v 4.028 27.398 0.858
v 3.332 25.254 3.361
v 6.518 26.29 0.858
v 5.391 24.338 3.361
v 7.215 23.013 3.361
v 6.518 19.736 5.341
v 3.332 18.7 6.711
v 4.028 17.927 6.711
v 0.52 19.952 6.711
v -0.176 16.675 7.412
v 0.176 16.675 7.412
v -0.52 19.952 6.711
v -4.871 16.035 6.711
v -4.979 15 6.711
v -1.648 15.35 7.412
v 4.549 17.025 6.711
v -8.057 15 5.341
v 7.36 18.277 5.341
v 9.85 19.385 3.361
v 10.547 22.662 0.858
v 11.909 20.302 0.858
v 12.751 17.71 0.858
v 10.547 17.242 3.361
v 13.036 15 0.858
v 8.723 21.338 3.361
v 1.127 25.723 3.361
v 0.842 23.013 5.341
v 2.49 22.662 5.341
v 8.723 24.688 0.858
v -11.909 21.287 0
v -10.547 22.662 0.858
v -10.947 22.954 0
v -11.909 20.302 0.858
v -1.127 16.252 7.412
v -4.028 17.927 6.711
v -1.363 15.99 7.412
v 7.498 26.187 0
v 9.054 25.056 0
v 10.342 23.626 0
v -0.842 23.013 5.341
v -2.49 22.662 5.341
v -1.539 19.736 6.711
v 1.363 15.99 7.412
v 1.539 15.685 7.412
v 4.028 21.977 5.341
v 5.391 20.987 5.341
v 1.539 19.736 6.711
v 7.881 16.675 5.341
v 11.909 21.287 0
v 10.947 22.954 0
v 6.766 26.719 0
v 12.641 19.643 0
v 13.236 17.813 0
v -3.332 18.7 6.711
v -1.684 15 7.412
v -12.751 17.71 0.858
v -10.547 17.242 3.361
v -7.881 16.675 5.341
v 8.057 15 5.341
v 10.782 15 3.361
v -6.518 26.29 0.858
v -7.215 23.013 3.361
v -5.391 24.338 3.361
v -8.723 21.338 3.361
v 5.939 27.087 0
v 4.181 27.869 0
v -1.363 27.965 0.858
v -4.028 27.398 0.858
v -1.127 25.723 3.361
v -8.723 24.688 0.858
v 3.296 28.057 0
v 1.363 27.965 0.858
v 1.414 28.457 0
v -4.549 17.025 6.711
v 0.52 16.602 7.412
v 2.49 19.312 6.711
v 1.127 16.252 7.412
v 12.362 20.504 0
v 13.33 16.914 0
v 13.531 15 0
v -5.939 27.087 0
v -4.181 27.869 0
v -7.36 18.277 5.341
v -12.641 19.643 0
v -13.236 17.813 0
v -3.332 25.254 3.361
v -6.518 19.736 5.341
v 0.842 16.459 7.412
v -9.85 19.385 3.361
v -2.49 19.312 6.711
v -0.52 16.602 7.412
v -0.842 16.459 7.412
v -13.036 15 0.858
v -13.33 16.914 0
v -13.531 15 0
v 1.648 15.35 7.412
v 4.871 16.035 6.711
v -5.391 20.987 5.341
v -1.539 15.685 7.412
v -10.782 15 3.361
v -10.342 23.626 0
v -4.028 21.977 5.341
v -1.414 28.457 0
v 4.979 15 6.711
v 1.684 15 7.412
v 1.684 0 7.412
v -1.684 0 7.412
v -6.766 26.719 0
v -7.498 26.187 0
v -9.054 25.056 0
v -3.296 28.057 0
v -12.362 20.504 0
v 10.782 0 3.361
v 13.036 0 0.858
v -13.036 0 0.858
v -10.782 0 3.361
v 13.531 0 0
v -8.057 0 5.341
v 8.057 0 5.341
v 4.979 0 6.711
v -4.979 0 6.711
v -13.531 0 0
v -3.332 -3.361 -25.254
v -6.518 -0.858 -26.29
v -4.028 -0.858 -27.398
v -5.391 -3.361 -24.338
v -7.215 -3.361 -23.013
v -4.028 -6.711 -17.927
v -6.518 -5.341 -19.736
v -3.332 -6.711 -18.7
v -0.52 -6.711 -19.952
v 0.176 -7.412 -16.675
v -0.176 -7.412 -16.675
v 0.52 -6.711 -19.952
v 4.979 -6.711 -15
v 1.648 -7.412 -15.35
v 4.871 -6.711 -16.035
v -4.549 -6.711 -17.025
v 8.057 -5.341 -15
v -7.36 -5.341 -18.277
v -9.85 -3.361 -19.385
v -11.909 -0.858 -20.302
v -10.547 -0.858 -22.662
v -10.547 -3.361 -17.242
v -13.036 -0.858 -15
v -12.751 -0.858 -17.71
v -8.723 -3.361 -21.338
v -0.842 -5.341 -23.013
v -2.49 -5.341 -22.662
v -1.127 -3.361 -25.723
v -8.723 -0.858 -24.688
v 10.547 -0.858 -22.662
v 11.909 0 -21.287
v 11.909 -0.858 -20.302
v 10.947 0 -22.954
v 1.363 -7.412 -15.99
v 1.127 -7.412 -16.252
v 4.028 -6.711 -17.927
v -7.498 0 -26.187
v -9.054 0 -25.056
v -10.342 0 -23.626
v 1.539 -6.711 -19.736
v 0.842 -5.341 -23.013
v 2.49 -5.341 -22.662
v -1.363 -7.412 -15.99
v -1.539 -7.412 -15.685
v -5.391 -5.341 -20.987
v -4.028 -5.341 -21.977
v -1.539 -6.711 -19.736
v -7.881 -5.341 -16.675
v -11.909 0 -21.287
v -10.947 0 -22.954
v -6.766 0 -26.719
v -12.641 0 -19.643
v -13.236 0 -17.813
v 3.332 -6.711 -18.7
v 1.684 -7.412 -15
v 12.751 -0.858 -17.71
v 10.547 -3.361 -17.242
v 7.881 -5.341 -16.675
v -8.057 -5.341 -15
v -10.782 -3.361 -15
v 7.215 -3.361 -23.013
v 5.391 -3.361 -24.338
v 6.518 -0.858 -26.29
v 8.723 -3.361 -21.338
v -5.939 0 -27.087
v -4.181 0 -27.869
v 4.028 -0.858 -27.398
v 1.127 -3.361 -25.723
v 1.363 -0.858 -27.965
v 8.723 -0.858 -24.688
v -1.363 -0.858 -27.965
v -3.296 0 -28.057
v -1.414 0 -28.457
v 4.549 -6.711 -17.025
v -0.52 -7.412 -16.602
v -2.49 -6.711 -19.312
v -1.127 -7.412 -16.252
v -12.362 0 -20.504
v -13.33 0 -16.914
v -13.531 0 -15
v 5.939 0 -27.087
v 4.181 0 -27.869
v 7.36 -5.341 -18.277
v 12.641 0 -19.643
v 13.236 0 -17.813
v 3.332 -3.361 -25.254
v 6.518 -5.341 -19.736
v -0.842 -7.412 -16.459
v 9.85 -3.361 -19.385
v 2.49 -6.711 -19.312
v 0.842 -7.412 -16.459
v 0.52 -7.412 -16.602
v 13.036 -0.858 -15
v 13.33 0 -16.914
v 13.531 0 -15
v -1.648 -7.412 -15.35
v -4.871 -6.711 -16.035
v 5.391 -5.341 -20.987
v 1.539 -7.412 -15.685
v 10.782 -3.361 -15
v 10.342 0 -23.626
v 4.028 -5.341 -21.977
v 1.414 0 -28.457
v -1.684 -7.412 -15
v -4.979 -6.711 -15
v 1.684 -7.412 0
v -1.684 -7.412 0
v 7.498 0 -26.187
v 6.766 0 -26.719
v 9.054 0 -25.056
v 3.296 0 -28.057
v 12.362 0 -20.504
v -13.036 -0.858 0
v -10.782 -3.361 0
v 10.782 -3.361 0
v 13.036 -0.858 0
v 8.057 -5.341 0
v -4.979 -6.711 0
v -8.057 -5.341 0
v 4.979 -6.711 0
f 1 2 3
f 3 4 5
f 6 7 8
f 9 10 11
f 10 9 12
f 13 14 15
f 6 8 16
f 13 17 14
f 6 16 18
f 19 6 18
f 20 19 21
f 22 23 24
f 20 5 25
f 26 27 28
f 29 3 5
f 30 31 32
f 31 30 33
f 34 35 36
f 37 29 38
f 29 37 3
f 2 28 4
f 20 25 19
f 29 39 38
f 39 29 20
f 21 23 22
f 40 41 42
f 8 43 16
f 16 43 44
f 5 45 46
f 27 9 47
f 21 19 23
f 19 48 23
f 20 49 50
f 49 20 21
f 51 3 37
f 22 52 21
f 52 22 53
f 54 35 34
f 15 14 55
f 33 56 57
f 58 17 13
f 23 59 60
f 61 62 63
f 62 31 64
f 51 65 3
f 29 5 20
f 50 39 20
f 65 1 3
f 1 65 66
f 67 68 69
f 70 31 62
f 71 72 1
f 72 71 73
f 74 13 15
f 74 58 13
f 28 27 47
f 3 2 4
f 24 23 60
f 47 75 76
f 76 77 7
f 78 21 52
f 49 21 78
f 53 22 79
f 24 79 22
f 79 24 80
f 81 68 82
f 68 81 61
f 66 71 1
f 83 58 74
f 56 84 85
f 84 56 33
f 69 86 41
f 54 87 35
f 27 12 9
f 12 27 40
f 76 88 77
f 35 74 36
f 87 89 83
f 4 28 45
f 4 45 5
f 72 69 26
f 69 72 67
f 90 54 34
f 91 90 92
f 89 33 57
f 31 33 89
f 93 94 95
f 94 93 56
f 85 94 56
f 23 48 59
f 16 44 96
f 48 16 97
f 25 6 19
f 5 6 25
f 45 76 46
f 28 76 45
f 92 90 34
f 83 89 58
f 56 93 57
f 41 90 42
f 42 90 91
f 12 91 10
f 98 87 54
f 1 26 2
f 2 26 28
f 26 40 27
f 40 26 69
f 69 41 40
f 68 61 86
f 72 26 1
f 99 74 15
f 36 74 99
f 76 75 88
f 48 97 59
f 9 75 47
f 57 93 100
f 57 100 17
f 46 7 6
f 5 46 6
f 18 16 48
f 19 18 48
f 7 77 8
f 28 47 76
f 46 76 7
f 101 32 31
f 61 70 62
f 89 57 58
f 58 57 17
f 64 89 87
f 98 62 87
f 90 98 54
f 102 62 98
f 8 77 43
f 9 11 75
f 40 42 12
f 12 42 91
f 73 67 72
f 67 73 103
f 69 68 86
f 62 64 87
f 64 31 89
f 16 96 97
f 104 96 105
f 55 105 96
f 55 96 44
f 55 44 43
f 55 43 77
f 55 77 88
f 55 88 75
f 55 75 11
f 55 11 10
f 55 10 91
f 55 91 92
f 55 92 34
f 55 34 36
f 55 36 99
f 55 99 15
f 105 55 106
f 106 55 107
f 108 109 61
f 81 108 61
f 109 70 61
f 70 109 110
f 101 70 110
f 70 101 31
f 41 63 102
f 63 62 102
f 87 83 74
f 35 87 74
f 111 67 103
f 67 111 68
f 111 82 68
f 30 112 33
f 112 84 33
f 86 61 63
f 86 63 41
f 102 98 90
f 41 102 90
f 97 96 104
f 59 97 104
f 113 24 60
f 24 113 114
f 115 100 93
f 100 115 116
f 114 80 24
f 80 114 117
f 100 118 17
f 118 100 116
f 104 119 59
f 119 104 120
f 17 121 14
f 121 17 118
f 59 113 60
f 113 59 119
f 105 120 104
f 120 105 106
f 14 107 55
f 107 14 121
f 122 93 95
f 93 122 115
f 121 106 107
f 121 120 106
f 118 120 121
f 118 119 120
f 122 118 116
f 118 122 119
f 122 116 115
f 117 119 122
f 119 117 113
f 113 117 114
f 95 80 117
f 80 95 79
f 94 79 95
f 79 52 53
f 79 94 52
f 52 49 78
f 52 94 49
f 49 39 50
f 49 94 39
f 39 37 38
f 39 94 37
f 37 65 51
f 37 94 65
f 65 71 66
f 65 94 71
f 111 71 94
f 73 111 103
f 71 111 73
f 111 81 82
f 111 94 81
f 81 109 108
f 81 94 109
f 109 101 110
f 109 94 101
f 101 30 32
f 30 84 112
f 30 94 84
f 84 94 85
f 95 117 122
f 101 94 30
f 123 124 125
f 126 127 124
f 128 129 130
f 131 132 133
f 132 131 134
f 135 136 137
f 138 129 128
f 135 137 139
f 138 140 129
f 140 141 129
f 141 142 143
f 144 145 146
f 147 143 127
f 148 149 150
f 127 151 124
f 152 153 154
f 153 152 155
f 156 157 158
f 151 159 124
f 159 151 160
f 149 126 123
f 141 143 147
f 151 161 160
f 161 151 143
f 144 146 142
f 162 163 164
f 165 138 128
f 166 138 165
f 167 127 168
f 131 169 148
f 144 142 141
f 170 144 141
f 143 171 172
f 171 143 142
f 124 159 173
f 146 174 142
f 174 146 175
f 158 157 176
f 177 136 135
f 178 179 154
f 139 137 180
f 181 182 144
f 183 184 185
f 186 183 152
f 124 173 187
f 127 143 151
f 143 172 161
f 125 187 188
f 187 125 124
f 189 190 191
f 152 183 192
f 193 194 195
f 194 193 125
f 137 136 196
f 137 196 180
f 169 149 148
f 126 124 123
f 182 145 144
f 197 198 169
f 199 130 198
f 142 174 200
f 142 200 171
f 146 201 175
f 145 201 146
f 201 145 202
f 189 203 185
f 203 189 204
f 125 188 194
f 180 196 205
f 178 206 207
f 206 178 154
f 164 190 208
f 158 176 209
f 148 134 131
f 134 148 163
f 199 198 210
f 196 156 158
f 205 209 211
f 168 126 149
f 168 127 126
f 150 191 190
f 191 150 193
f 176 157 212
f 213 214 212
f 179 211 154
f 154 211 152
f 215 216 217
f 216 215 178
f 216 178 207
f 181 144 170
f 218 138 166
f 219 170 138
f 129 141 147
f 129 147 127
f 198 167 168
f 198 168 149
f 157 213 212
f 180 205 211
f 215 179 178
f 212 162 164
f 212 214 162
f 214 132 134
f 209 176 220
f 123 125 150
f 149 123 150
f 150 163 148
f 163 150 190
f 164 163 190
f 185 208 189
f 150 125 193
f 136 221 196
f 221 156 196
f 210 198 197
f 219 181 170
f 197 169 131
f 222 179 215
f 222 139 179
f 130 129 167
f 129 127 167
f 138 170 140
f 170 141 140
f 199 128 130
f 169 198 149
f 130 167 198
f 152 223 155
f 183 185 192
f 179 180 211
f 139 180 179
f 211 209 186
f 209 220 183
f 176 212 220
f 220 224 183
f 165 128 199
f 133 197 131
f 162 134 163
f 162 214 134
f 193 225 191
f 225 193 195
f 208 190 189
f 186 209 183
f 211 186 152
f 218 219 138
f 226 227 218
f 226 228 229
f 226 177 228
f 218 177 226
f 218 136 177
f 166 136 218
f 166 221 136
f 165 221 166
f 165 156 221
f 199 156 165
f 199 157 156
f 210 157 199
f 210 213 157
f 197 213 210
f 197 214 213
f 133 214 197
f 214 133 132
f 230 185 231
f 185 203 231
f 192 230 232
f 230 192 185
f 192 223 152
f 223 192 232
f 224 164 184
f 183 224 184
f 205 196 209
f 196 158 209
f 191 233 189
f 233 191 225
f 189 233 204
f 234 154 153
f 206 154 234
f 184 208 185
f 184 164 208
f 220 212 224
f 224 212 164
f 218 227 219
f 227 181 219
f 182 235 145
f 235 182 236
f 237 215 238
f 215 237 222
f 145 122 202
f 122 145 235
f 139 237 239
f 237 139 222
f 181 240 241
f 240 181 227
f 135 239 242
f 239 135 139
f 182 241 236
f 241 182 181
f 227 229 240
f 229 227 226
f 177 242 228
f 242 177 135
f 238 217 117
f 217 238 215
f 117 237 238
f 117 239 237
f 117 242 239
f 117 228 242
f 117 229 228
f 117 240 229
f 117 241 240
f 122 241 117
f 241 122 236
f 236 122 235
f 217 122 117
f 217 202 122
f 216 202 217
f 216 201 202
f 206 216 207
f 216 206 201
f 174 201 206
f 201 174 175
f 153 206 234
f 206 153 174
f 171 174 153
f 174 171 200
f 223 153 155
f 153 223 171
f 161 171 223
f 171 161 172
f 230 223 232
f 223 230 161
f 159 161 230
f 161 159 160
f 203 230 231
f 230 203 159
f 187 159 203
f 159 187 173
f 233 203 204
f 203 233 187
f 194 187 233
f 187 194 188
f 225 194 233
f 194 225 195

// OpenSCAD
//              +++++++++++++
//        +         |   |-h       +
//     +------------+   +------------+
//   +      r       |   |              +
//  +               |   |-radius        +
//  ----------------+   +----------------
//                     |radius
//
// (radius - r)² + r² = (radius)²
//

height    = 7.5;
r         = 11;
alpha     = 45;
radius    = ((height * height) + (r * r)) / r;
cylh      = 15;
eps       = 0;


module rounded_part () {
    translate ([0, cylh, 0])
    difference () {
        translate ([0, 0, -radius + height])
            union () {
                sphere (radius);
                rotate (90, [1, 0, 0])
                    cylinder (h=cylh, r = radius);
            }
        translate ([0, 0, -2 * radius])
            cube (4 * radius + eps, center = true);
        translate ([0, -(cylh + 2 * radius), 0])
            cube (4 * radius + eps, center = true);
    }
}

union () {
    rounded_part ();
    rotate (90, [1, 0, 0])
        rotate (180, [0, 0, 1])
            rounded_part ();
}
